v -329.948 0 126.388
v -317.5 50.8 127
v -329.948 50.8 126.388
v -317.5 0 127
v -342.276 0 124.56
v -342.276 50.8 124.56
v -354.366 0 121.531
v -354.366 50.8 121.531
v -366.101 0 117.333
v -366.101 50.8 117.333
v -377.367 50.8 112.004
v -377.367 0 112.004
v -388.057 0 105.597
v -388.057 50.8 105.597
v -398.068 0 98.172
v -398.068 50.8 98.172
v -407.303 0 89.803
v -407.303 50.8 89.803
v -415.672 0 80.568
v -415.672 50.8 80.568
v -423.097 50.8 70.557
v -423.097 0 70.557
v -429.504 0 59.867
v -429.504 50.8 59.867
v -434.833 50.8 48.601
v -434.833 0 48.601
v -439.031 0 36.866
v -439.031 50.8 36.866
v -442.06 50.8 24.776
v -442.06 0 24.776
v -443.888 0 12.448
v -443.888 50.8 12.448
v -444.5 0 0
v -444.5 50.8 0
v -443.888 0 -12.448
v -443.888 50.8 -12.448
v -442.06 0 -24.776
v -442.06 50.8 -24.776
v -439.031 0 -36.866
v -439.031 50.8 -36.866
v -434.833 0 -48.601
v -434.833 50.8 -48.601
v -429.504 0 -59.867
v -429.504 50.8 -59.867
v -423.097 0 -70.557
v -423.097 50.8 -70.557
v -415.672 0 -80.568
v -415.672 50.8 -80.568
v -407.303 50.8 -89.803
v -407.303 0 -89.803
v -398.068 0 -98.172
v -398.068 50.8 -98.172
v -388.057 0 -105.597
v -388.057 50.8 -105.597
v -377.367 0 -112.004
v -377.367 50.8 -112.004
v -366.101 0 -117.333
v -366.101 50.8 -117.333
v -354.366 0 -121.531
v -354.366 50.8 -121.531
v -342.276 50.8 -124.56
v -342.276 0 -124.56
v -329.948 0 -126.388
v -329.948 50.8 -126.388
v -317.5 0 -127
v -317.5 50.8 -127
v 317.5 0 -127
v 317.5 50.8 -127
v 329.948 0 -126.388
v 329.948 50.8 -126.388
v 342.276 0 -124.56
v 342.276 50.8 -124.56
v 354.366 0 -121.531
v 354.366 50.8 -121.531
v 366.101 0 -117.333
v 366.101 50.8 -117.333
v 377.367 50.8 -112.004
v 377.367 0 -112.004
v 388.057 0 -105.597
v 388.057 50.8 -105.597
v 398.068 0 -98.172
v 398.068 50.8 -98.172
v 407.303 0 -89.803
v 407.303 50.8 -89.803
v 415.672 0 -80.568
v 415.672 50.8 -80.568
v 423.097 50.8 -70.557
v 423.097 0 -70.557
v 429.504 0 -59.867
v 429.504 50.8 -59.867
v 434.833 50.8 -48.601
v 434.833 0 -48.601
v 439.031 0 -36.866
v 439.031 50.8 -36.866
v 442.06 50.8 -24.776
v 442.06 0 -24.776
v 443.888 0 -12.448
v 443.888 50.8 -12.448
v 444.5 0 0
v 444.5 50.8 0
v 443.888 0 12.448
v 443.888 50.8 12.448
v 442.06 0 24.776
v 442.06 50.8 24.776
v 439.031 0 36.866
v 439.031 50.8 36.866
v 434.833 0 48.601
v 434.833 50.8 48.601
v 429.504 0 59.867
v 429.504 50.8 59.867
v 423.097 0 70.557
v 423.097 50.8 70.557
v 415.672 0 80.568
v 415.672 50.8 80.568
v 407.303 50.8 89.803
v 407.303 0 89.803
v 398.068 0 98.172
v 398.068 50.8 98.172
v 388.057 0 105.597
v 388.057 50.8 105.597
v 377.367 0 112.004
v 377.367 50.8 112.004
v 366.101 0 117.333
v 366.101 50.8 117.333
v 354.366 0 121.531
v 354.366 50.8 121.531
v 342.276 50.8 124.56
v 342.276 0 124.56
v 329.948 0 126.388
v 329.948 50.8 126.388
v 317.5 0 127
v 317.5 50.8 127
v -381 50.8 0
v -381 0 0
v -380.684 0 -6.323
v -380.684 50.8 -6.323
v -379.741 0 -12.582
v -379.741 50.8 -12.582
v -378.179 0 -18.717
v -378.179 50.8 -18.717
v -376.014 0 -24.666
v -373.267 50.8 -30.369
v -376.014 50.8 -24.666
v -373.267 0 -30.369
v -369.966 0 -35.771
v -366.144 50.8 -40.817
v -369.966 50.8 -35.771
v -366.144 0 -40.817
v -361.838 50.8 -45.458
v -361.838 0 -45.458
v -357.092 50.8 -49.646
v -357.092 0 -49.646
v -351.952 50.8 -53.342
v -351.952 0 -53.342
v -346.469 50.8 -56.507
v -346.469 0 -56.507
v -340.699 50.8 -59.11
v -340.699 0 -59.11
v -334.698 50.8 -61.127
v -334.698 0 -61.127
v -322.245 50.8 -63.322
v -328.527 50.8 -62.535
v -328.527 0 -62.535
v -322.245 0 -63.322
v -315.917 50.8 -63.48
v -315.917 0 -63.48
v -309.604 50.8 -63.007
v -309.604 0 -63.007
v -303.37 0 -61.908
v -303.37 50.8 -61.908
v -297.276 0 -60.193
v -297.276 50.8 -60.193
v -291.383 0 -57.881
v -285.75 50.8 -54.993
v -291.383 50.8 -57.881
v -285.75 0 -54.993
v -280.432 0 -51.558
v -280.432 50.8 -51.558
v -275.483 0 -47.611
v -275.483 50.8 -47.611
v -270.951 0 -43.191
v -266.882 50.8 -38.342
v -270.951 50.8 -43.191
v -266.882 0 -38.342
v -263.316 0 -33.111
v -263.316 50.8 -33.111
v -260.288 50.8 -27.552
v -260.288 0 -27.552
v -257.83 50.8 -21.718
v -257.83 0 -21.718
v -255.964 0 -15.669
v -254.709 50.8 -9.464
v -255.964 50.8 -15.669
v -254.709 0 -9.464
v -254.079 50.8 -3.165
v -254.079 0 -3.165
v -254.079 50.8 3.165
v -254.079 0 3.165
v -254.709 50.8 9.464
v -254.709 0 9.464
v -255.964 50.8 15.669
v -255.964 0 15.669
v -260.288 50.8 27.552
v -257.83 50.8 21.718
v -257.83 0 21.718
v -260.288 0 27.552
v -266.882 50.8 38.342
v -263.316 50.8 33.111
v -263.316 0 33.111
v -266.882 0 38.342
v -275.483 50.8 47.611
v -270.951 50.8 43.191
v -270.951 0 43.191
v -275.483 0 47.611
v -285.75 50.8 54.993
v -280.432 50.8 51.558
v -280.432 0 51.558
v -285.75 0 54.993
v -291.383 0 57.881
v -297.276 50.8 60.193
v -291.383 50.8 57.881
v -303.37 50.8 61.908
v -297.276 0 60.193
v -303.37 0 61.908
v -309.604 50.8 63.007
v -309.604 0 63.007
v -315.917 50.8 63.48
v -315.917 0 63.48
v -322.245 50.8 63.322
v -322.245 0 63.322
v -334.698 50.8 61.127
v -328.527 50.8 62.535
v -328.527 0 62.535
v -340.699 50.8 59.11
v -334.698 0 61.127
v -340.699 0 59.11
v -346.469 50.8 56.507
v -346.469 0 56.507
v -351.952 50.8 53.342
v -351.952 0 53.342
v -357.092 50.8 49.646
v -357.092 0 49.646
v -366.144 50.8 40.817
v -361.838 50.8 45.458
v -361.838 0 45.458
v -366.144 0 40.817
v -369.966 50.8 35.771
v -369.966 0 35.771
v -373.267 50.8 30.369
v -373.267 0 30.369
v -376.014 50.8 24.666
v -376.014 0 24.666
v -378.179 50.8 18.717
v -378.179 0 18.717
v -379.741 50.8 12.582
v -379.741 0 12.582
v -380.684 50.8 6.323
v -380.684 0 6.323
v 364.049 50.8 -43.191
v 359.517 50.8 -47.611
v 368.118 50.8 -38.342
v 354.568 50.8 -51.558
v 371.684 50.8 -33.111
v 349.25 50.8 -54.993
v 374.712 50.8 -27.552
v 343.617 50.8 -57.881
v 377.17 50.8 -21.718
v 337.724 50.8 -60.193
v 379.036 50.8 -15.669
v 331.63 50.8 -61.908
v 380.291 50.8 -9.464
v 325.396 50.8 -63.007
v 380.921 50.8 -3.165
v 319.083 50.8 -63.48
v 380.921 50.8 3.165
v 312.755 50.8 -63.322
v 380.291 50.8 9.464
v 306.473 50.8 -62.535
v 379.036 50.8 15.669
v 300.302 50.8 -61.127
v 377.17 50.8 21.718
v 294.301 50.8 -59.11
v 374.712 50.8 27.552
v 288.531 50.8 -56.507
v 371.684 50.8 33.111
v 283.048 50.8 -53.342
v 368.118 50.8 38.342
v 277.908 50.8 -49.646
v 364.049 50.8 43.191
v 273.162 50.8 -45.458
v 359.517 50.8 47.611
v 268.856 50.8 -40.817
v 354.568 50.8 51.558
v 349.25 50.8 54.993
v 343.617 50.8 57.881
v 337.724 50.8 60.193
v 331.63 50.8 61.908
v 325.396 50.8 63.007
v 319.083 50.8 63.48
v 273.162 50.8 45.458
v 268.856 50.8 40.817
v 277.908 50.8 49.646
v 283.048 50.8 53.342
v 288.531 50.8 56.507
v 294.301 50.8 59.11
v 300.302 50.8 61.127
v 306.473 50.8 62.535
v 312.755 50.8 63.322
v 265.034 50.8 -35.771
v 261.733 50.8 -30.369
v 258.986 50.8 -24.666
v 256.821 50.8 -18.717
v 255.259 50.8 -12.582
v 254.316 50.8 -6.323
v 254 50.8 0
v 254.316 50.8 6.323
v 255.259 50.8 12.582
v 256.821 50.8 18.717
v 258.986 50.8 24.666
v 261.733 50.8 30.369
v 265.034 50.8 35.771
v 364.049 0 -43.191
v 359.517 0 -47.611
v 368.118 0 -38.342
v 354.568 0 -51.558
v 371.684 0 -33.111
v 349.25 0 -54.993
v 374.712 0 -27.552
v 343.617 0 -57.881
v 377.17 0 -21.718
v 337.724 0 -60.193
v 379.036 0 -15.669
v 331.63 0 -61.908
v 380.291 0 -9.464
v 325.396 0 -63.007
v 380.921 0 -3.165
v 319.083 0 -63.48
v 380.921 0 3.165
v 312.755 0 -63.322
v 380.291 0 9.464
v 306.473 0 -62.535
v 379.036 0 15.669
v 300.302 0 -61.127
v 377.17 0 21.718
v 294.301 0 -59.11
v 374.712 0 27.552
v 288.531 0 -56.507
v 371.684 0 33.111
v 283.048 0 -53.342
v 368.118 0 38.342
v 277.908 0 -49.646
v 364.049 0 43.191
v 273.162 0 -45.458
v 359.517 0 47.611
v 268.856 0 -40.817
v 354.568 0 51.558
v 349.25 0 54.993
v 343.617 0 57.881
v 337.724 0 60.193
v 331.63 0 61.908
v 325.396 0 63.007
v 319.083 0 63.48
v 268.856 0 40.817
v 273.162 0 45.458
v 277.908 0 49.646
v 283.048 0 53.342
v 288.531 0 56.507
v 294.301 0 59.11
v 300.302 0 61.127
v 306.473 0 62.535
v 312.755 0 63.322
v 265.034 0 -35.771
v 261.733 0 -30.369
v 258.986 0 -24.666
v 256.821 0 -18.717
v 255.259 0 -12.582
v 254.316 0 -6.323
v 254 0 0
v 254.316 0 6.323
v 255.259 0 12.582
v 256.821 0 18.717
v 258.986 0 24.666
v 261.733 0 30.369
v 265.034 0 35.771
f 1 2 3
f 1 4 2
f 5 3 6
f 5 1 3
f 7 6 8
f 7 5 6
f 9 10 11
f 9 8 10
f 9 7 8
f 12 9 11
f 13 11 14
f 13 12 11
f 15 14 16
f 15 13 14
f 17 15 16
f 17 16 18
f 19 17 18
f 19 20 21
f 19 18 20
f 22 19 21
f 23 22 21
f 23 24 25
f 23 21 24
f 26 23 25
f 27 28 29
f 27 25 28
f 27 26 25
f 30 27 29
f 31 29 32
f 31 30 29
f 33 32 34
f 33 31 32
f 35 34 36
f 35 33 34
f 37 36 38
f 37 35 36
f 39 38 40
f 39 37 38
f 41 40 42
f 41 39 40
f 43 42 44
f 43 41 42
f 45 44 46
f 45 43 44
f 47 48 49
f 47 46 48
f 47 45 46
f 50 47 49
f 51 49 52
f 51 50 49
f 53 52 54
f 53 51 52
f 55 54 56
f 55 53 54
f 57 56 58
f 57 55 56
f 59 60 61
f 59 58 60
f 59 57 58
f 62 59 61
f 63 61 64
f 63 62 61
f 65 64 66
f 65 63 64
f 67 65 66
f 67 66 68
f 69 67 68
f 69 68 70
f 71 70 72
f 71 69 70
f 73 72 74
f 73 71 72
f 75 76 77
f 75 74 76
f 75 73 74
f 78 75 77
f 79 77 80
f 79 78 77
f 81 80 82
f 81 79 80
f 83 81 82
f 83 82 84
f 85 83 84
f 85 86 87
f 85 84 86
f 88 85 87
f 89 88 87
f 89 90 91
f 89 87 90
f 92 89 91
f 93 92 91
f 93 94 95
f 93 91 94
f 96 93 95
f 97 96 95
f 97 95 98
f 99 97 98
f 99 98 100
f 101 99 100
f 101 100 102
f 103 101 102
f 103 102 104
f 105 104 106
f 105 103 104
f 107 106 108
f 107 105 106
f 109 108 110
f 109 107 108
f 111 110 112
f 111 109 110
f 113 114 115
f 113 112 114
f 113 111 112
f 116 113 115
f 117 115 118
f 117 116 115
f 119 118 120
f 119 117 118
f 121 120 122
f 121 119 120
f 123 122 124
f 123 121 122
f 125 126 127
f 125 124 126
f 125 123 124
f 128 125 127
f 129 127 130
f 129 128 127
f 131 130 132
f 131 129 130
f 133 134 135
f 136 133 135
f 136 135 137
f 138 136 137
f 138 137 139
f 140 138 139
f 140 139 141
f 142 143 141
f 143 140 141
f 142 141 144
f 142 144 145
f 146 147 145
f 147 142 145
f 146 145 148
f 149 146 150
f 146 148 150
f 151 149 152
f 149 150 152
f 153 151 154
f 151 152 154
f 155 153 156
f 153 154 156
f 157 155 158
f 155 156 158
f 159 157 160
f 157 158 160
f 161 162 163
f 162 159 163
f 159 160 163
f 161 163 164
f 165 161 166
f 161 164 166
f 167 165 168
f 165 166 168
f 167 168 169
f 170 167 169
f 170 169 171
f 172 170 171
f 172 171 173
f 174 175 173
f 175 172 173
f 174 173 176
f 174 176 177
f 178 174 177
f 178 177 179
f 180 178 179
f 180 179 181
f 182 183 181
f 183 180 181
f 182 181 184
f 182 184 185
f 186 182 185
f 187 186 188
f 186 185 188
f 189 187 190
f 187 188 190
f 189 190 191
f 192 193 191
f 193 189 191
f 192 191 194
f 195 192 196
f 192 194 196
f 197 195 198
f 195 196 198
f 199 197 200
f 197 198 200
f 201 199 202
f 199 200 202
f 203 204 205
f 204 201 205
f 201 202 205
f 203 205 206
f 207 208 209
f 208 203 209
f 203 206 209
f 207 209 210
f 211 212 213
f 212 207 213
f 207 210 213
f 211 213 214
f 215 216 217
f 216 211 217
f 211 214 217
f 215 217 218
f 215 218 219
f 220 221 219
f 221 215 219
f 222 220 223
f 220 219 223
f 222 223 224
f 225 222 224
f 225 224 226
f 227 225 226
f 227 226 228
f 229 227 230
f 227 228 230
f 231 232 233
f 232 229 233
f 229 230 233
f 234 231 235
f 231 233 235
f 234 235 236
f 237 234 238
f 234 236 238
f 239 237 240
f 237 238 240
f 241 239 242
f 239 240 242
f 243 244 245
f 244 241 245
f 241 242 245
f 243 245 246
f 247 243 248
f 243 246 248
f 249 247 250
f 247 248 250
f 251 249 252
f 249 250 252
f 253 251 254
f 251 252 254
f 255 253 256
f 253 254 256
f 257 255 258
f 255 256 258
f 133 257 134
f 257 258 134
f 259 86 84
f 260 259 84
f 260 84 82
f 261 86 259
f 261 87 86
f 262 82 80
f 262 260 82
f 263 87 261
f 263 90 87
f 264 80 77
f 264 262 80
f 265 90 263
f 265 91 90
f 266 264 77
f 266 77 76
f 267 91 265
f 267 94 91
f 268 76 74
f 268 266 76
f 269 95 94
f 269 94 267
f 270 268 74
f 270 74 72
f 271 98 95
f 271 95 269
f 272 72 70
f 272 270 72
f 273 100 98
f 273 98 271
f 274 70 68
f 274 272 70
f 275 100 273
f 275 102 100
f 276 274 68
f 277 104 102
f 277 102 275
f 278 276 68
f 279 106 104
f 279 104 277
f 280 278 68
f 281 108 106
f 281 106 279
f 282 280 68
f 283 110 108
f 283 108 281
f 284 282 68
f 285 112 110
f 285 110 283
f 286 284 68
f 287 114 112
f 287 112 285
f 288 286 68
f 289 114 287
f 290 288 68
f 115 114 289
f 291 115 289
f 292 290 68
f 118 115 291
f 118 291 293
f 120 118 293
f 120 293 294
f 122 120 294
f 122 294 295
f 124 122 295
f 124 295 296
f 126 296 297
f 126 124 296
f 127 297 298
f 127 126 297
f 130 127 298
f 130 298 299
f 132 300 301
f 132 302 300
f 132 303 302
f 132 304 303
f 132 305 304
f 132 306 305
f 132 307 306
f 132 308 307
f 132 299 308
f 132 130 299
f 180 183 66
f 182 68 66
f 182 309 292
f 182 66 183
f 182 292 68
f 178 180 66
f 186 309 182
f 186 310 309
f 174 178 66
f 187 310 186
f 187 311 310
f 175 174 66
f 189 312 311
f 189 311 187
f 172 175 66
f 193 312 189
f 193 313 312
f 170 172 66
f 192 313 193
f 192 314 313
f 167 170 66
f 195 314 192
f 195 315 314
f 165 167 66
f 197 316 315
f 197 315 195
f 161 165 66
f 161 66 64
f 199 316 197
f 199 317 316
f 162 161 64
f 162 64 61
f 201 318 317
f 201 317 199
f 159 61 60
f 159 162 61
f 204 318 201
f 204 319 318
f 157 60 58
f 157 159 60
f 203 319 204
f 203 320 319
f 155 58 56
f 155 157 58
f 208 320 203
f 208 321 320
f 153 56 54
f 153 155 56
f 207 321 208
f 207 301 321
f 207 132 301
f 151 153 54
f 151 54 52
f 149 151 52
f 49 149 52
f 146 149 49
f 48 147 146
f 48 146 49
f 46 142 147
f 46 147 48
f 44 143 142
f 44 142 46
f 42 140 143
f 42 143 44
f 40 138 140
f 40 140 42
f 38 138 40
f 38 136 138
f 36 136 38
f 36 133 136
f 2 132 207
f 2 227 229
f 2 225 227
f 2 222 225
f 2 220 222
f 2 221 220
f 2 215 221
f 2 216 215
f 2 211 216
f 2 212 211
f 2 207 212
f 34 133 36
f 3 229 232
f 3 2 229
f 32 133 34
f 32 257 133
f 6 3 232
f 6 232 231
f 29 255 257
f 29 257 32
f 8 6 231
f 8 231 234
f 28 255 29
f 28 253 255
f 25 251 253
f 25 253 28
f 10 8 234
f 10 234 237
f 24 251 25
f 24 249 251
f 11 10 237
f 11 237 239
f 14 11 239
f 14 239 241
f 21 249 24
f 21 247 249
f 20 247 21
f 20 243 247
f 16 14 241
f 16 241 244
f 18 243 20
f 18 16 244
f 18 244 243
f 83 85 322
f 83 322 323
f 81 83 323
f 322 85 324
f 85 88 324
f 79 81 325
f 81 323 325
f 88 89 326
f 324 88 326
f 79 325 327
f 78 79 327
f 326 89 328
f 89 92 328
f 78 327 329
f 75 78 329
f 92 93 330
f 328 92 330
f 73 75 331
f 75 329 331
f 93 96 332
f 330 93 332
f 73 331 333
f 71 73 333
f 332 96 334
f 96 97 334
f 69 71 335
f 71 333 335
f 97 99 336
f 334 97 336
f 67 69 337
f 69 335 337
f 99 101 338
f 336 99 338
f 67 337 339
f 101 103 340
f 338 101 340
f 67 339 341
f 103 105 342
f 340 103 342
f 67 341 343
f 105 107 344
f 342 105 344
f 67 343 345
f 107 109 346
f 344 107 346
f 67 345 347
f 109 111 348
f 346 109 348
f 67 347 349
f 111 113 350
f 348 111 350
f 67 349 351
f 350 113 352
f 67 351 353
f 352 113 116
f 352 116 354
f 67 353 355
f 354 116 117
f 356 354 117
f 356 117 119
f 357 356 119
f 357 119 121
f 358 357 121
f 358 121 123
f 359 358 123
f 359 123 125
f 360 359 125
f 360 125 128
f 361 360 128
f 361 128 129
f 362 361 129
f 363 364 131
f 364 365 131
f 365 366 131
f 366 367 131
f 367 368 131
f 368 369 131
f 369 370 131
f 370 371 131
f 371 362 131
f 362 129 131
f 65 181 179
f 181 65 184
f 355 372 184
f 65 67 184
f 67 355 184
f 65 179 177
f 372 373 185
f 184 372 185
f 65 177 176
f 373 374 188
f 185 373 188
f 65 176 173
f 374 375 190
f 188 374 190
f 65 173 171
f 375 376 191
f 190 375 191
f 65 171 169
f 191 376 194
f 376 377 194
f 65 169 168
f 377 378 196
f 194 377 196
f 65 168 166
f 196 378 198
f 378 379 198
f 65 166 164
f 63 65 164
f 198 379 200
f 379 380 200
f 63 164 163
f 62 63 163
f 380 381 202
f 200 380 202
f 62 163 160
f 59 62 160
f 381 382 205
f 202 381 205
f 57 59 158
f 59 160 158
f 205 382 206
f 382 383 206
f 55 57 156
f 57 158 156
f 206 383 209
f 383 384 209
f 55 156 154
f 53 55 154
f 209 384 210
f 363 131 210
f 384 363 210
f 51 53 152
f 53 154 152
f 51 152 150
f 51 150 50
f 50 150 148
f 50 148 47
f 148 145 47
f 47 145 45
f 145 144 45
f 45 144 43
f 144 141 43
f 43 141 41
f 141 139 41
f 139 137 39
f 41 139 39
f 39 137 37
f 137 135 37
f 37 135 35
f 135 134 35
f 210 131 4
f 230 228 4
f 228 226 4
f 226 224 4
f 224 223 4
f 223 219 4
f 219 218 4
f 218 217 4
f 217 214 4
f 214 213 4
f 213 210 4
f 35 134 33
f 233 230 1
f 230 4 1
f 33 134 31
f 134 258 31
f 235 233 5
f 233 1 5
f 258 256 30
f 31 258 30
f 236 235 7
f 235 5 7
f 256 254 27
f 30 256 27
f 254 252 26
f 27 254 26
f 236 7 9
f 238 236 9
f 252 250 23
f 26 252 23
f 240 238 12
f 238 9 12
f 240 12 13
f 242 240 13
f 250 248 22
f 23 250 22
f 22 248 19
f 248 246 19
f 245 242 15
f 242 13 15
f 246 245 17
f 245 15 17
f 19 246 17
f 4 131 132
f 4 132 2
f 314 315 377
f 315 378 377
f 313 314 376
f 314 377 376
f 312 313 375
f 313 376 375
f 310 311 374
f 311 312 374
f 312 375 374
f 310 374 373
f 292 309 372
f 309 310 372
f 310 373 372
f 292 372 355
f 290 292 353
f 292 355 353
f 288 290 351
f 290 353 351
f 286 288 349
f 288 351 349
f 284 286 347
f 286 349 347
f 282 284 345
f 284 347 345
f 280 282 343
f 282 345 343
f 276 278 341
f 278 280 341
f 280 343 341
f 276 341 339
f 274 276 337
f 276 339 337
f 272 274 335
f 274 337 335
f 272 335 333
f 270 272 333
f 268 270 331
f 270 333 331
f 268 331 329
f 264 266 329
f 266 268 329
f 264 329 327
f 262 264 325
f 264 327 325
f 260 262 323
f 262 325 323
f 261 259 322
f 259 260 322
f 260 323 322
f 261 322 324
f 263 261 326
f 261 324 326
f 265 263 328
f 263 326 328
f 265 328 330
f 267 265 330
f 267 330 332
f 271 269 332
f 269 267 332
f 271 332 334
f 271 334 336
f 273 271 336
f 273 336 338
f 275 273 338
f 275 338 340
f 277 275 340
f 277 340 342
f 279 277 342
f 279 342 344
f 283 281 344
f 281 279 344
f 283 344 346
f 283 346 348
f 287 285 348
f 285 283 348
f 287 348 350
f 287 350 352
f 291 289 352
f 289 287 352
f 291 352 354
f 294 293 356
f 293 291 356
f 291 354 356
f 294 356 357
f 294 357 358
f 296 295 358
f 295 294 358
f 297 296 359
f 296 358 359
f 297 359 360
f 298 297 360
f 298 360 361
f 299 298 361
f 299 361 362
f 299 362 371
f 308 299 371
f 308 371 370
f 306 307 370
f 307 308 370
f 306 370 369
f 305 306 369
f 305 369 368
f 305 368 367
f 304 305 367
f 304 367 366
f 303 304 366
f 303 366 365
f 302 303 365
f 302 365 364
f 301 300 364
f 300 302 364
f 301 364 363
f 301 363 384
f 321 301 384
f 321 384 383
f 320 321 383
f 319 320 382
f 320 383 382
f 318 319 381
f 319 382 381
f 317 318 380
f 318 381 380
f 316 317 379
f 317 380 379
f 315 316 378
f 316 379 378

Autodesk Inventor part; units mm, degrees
ref_plane "YZ Plane" through (0, 0, 0) normal (1, 0, 0) x (0, 1, 0)
ref_plane "XZ Plane" through (0, 0, 0) normal (0, 1, 0) x (-1, 0, 0)
ref_plane "XY Plane" through (0, 0, 0) normal (0, 0, 1) x (1, 0, 0)
sketch "Sketch1" plane through (0, 0, 0) normal (0, 1, 0) x (-1, 0, 0)
  line L0 (-317.5, 127) -> (317.5, 127)
  line L1 (317.5, 127) -> (317.5, -127) construction
  line L2 (317.5, -127) -> (-317.5, -127)
  line L3 (-317.5, -127) -> (-317.5, 127) construction
  line L4 (-317.5, 127) -> (317.5, -127) construction
  line L5 (317.5, 127) -> (-317.5, -127) construction
  arc A0 (317.5, -127) -> (317.5, 127) centre (317.5, 0) ccw
  arc A1 (-317.5, 127) -> (-317.5, -127) centre (-317.5, 0) ccw
  circle A2 centre (317.5, 0) radius 63.5
  circle A3 centre (-317.5, 0) radius 63.5
  point P0 (0, 0)
  dimension "d0" = 635
  dimension "d1" = 254
  dimension "d2" = 127
  dimension "d3" = 127
extrude "Extrusion1" add sketch "Sketch1" along normal blind 50.8
properties part number "Input"
